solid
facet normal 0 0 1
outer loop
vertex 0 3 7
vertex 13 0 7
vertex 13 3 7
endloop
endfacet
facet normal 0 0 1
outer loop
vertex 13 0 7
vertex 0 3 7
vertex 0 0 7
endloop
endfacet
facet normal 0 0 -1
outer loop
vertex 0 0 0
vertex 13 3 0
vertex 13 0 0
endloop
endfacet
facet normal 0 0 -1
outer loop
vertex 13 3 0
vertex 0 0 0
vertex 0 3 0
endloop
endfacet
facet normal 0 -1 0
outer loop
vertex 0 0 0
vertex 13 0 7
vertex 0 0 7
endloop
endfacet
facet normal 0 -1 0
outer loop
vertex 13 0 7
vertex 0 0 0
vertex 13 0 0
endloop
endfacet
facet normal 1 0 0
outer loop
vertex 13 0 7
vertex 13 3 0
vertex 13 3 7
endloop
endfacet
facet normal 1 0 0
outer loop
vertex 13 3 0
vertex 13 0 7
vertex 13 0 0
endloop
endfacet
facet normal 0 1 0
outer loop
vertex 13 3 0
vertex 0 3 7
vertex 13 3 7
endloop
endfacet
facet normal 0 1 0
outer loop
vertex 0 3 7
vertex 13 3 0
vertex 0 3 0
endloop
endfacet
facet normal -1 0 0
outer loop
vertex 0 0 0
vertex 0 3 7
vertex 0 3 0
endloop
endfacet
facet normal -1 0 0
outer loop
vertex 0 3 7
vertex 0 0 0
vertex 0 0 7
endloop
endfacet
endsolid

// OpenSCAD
// Generated by SolidPython 1.0.1 on 2020-07-29 00:46:55


cube(size = [13, 3, 7]);
/***********************************************
*********      SolidPython code:      **********
************************************************
 
# import packages: SolidPython
from solid import *
from solid.utils import *
from itertools import chain, combinations, permutations


class Resize:

    def __init__(self, scad_file):
        self.scad_file = scad_file
        #self.scad_file = import_scad(scad_file)
        # cone/cylinder param:
        self.r1 = 0
        self.r2 = 0
        self.h = 0
        # rectangular prism param:
        self.w = 0
        self.l = 0
        # ellipse param:
        self.r = 0

    # import OpenScad code (file name corresponds to shape)


    # classify shape + parameters
    def assign(self, param1, param2, param3):
        if self.scad_file == 'cone.scad':
            self.r1 = param1
            self.r2 = param2
            self.h = param3
        elif self.scad_file == 'cylinder.scad':
            self.r1 = param1
            self.r2 = param2
            self.h = param3
        elif self.scad_file == 'rectangularPrism.scad':
            self.h = param1
            self.l = param2
            self.w = param3
        else:
            self.r = param1
            self.h = param2

    # resize parameters
    def iterate(self):
        x = range(3, 20, 2)
        i = 1
        if self.scad_file == 'cone.scad':
            tempList = list(permutations(x, 2))
            for temp in tempList:
                param1 = temp[0]
                param2 = temp[1]
                filepath = 'produced_scad_files/' + 'cone' + str(param1) + '_' + str(param2) + '_' + '.scad'
                scad_render_to_file(cylinder(h=param1, r1=param2, r2=0), filepath)

        elif self.scad_file == 'cylinder.scad':
            tempList = list(permutations(x, 3))
            for temp in tempList:
                param1 = temp[0]
                param2 = temp[1]
                filepath = 'produced_scad_files/' + 'cylinder' + str(param1) + '_' + str(param2) + '_' + '.scad'
                scad_render_to_file(cylinder(h=param1, r1=param2, r2=param2), filepath)

        elif self.scad_file == 'rectangularPrism.scad':
            tempList = list(permutations(x, 3))
            for temp in tempList:
                param1 = temp[0]
                param2 = temp[1]
                param3 = temp[2]
                filepath = 'produced_scad_files/' + 'rectangularPrism' + str(param1) + '_' + str(param2) + '_' + str(
                    param3) + '.scad'
                scad_render_to_file(cube(size=(param1, param2, param3)), filepath)

        elif self.scad_file == 'ellipse.scad':
            tempList = list(permutations(x, 4))
            for temp in tempList:
                param1 = temp[0]
                param2 = temp[1]
                param3 = temp[2]
                param4 = temp[3]
                filepath = 'produced_scad_files/' + 'ellipse' + str(param1) + '_' + str(param2) + '_' + str(param3) + '_' + str(param4) + '.scad'
                scad_render_to_file(scale([param1, param2, param3])(sphere(r=param4)), filepath)

    def render_to_scadfile(self):
        scad_render_to_file(scad, 'example.scad') 
 
************************************************/
